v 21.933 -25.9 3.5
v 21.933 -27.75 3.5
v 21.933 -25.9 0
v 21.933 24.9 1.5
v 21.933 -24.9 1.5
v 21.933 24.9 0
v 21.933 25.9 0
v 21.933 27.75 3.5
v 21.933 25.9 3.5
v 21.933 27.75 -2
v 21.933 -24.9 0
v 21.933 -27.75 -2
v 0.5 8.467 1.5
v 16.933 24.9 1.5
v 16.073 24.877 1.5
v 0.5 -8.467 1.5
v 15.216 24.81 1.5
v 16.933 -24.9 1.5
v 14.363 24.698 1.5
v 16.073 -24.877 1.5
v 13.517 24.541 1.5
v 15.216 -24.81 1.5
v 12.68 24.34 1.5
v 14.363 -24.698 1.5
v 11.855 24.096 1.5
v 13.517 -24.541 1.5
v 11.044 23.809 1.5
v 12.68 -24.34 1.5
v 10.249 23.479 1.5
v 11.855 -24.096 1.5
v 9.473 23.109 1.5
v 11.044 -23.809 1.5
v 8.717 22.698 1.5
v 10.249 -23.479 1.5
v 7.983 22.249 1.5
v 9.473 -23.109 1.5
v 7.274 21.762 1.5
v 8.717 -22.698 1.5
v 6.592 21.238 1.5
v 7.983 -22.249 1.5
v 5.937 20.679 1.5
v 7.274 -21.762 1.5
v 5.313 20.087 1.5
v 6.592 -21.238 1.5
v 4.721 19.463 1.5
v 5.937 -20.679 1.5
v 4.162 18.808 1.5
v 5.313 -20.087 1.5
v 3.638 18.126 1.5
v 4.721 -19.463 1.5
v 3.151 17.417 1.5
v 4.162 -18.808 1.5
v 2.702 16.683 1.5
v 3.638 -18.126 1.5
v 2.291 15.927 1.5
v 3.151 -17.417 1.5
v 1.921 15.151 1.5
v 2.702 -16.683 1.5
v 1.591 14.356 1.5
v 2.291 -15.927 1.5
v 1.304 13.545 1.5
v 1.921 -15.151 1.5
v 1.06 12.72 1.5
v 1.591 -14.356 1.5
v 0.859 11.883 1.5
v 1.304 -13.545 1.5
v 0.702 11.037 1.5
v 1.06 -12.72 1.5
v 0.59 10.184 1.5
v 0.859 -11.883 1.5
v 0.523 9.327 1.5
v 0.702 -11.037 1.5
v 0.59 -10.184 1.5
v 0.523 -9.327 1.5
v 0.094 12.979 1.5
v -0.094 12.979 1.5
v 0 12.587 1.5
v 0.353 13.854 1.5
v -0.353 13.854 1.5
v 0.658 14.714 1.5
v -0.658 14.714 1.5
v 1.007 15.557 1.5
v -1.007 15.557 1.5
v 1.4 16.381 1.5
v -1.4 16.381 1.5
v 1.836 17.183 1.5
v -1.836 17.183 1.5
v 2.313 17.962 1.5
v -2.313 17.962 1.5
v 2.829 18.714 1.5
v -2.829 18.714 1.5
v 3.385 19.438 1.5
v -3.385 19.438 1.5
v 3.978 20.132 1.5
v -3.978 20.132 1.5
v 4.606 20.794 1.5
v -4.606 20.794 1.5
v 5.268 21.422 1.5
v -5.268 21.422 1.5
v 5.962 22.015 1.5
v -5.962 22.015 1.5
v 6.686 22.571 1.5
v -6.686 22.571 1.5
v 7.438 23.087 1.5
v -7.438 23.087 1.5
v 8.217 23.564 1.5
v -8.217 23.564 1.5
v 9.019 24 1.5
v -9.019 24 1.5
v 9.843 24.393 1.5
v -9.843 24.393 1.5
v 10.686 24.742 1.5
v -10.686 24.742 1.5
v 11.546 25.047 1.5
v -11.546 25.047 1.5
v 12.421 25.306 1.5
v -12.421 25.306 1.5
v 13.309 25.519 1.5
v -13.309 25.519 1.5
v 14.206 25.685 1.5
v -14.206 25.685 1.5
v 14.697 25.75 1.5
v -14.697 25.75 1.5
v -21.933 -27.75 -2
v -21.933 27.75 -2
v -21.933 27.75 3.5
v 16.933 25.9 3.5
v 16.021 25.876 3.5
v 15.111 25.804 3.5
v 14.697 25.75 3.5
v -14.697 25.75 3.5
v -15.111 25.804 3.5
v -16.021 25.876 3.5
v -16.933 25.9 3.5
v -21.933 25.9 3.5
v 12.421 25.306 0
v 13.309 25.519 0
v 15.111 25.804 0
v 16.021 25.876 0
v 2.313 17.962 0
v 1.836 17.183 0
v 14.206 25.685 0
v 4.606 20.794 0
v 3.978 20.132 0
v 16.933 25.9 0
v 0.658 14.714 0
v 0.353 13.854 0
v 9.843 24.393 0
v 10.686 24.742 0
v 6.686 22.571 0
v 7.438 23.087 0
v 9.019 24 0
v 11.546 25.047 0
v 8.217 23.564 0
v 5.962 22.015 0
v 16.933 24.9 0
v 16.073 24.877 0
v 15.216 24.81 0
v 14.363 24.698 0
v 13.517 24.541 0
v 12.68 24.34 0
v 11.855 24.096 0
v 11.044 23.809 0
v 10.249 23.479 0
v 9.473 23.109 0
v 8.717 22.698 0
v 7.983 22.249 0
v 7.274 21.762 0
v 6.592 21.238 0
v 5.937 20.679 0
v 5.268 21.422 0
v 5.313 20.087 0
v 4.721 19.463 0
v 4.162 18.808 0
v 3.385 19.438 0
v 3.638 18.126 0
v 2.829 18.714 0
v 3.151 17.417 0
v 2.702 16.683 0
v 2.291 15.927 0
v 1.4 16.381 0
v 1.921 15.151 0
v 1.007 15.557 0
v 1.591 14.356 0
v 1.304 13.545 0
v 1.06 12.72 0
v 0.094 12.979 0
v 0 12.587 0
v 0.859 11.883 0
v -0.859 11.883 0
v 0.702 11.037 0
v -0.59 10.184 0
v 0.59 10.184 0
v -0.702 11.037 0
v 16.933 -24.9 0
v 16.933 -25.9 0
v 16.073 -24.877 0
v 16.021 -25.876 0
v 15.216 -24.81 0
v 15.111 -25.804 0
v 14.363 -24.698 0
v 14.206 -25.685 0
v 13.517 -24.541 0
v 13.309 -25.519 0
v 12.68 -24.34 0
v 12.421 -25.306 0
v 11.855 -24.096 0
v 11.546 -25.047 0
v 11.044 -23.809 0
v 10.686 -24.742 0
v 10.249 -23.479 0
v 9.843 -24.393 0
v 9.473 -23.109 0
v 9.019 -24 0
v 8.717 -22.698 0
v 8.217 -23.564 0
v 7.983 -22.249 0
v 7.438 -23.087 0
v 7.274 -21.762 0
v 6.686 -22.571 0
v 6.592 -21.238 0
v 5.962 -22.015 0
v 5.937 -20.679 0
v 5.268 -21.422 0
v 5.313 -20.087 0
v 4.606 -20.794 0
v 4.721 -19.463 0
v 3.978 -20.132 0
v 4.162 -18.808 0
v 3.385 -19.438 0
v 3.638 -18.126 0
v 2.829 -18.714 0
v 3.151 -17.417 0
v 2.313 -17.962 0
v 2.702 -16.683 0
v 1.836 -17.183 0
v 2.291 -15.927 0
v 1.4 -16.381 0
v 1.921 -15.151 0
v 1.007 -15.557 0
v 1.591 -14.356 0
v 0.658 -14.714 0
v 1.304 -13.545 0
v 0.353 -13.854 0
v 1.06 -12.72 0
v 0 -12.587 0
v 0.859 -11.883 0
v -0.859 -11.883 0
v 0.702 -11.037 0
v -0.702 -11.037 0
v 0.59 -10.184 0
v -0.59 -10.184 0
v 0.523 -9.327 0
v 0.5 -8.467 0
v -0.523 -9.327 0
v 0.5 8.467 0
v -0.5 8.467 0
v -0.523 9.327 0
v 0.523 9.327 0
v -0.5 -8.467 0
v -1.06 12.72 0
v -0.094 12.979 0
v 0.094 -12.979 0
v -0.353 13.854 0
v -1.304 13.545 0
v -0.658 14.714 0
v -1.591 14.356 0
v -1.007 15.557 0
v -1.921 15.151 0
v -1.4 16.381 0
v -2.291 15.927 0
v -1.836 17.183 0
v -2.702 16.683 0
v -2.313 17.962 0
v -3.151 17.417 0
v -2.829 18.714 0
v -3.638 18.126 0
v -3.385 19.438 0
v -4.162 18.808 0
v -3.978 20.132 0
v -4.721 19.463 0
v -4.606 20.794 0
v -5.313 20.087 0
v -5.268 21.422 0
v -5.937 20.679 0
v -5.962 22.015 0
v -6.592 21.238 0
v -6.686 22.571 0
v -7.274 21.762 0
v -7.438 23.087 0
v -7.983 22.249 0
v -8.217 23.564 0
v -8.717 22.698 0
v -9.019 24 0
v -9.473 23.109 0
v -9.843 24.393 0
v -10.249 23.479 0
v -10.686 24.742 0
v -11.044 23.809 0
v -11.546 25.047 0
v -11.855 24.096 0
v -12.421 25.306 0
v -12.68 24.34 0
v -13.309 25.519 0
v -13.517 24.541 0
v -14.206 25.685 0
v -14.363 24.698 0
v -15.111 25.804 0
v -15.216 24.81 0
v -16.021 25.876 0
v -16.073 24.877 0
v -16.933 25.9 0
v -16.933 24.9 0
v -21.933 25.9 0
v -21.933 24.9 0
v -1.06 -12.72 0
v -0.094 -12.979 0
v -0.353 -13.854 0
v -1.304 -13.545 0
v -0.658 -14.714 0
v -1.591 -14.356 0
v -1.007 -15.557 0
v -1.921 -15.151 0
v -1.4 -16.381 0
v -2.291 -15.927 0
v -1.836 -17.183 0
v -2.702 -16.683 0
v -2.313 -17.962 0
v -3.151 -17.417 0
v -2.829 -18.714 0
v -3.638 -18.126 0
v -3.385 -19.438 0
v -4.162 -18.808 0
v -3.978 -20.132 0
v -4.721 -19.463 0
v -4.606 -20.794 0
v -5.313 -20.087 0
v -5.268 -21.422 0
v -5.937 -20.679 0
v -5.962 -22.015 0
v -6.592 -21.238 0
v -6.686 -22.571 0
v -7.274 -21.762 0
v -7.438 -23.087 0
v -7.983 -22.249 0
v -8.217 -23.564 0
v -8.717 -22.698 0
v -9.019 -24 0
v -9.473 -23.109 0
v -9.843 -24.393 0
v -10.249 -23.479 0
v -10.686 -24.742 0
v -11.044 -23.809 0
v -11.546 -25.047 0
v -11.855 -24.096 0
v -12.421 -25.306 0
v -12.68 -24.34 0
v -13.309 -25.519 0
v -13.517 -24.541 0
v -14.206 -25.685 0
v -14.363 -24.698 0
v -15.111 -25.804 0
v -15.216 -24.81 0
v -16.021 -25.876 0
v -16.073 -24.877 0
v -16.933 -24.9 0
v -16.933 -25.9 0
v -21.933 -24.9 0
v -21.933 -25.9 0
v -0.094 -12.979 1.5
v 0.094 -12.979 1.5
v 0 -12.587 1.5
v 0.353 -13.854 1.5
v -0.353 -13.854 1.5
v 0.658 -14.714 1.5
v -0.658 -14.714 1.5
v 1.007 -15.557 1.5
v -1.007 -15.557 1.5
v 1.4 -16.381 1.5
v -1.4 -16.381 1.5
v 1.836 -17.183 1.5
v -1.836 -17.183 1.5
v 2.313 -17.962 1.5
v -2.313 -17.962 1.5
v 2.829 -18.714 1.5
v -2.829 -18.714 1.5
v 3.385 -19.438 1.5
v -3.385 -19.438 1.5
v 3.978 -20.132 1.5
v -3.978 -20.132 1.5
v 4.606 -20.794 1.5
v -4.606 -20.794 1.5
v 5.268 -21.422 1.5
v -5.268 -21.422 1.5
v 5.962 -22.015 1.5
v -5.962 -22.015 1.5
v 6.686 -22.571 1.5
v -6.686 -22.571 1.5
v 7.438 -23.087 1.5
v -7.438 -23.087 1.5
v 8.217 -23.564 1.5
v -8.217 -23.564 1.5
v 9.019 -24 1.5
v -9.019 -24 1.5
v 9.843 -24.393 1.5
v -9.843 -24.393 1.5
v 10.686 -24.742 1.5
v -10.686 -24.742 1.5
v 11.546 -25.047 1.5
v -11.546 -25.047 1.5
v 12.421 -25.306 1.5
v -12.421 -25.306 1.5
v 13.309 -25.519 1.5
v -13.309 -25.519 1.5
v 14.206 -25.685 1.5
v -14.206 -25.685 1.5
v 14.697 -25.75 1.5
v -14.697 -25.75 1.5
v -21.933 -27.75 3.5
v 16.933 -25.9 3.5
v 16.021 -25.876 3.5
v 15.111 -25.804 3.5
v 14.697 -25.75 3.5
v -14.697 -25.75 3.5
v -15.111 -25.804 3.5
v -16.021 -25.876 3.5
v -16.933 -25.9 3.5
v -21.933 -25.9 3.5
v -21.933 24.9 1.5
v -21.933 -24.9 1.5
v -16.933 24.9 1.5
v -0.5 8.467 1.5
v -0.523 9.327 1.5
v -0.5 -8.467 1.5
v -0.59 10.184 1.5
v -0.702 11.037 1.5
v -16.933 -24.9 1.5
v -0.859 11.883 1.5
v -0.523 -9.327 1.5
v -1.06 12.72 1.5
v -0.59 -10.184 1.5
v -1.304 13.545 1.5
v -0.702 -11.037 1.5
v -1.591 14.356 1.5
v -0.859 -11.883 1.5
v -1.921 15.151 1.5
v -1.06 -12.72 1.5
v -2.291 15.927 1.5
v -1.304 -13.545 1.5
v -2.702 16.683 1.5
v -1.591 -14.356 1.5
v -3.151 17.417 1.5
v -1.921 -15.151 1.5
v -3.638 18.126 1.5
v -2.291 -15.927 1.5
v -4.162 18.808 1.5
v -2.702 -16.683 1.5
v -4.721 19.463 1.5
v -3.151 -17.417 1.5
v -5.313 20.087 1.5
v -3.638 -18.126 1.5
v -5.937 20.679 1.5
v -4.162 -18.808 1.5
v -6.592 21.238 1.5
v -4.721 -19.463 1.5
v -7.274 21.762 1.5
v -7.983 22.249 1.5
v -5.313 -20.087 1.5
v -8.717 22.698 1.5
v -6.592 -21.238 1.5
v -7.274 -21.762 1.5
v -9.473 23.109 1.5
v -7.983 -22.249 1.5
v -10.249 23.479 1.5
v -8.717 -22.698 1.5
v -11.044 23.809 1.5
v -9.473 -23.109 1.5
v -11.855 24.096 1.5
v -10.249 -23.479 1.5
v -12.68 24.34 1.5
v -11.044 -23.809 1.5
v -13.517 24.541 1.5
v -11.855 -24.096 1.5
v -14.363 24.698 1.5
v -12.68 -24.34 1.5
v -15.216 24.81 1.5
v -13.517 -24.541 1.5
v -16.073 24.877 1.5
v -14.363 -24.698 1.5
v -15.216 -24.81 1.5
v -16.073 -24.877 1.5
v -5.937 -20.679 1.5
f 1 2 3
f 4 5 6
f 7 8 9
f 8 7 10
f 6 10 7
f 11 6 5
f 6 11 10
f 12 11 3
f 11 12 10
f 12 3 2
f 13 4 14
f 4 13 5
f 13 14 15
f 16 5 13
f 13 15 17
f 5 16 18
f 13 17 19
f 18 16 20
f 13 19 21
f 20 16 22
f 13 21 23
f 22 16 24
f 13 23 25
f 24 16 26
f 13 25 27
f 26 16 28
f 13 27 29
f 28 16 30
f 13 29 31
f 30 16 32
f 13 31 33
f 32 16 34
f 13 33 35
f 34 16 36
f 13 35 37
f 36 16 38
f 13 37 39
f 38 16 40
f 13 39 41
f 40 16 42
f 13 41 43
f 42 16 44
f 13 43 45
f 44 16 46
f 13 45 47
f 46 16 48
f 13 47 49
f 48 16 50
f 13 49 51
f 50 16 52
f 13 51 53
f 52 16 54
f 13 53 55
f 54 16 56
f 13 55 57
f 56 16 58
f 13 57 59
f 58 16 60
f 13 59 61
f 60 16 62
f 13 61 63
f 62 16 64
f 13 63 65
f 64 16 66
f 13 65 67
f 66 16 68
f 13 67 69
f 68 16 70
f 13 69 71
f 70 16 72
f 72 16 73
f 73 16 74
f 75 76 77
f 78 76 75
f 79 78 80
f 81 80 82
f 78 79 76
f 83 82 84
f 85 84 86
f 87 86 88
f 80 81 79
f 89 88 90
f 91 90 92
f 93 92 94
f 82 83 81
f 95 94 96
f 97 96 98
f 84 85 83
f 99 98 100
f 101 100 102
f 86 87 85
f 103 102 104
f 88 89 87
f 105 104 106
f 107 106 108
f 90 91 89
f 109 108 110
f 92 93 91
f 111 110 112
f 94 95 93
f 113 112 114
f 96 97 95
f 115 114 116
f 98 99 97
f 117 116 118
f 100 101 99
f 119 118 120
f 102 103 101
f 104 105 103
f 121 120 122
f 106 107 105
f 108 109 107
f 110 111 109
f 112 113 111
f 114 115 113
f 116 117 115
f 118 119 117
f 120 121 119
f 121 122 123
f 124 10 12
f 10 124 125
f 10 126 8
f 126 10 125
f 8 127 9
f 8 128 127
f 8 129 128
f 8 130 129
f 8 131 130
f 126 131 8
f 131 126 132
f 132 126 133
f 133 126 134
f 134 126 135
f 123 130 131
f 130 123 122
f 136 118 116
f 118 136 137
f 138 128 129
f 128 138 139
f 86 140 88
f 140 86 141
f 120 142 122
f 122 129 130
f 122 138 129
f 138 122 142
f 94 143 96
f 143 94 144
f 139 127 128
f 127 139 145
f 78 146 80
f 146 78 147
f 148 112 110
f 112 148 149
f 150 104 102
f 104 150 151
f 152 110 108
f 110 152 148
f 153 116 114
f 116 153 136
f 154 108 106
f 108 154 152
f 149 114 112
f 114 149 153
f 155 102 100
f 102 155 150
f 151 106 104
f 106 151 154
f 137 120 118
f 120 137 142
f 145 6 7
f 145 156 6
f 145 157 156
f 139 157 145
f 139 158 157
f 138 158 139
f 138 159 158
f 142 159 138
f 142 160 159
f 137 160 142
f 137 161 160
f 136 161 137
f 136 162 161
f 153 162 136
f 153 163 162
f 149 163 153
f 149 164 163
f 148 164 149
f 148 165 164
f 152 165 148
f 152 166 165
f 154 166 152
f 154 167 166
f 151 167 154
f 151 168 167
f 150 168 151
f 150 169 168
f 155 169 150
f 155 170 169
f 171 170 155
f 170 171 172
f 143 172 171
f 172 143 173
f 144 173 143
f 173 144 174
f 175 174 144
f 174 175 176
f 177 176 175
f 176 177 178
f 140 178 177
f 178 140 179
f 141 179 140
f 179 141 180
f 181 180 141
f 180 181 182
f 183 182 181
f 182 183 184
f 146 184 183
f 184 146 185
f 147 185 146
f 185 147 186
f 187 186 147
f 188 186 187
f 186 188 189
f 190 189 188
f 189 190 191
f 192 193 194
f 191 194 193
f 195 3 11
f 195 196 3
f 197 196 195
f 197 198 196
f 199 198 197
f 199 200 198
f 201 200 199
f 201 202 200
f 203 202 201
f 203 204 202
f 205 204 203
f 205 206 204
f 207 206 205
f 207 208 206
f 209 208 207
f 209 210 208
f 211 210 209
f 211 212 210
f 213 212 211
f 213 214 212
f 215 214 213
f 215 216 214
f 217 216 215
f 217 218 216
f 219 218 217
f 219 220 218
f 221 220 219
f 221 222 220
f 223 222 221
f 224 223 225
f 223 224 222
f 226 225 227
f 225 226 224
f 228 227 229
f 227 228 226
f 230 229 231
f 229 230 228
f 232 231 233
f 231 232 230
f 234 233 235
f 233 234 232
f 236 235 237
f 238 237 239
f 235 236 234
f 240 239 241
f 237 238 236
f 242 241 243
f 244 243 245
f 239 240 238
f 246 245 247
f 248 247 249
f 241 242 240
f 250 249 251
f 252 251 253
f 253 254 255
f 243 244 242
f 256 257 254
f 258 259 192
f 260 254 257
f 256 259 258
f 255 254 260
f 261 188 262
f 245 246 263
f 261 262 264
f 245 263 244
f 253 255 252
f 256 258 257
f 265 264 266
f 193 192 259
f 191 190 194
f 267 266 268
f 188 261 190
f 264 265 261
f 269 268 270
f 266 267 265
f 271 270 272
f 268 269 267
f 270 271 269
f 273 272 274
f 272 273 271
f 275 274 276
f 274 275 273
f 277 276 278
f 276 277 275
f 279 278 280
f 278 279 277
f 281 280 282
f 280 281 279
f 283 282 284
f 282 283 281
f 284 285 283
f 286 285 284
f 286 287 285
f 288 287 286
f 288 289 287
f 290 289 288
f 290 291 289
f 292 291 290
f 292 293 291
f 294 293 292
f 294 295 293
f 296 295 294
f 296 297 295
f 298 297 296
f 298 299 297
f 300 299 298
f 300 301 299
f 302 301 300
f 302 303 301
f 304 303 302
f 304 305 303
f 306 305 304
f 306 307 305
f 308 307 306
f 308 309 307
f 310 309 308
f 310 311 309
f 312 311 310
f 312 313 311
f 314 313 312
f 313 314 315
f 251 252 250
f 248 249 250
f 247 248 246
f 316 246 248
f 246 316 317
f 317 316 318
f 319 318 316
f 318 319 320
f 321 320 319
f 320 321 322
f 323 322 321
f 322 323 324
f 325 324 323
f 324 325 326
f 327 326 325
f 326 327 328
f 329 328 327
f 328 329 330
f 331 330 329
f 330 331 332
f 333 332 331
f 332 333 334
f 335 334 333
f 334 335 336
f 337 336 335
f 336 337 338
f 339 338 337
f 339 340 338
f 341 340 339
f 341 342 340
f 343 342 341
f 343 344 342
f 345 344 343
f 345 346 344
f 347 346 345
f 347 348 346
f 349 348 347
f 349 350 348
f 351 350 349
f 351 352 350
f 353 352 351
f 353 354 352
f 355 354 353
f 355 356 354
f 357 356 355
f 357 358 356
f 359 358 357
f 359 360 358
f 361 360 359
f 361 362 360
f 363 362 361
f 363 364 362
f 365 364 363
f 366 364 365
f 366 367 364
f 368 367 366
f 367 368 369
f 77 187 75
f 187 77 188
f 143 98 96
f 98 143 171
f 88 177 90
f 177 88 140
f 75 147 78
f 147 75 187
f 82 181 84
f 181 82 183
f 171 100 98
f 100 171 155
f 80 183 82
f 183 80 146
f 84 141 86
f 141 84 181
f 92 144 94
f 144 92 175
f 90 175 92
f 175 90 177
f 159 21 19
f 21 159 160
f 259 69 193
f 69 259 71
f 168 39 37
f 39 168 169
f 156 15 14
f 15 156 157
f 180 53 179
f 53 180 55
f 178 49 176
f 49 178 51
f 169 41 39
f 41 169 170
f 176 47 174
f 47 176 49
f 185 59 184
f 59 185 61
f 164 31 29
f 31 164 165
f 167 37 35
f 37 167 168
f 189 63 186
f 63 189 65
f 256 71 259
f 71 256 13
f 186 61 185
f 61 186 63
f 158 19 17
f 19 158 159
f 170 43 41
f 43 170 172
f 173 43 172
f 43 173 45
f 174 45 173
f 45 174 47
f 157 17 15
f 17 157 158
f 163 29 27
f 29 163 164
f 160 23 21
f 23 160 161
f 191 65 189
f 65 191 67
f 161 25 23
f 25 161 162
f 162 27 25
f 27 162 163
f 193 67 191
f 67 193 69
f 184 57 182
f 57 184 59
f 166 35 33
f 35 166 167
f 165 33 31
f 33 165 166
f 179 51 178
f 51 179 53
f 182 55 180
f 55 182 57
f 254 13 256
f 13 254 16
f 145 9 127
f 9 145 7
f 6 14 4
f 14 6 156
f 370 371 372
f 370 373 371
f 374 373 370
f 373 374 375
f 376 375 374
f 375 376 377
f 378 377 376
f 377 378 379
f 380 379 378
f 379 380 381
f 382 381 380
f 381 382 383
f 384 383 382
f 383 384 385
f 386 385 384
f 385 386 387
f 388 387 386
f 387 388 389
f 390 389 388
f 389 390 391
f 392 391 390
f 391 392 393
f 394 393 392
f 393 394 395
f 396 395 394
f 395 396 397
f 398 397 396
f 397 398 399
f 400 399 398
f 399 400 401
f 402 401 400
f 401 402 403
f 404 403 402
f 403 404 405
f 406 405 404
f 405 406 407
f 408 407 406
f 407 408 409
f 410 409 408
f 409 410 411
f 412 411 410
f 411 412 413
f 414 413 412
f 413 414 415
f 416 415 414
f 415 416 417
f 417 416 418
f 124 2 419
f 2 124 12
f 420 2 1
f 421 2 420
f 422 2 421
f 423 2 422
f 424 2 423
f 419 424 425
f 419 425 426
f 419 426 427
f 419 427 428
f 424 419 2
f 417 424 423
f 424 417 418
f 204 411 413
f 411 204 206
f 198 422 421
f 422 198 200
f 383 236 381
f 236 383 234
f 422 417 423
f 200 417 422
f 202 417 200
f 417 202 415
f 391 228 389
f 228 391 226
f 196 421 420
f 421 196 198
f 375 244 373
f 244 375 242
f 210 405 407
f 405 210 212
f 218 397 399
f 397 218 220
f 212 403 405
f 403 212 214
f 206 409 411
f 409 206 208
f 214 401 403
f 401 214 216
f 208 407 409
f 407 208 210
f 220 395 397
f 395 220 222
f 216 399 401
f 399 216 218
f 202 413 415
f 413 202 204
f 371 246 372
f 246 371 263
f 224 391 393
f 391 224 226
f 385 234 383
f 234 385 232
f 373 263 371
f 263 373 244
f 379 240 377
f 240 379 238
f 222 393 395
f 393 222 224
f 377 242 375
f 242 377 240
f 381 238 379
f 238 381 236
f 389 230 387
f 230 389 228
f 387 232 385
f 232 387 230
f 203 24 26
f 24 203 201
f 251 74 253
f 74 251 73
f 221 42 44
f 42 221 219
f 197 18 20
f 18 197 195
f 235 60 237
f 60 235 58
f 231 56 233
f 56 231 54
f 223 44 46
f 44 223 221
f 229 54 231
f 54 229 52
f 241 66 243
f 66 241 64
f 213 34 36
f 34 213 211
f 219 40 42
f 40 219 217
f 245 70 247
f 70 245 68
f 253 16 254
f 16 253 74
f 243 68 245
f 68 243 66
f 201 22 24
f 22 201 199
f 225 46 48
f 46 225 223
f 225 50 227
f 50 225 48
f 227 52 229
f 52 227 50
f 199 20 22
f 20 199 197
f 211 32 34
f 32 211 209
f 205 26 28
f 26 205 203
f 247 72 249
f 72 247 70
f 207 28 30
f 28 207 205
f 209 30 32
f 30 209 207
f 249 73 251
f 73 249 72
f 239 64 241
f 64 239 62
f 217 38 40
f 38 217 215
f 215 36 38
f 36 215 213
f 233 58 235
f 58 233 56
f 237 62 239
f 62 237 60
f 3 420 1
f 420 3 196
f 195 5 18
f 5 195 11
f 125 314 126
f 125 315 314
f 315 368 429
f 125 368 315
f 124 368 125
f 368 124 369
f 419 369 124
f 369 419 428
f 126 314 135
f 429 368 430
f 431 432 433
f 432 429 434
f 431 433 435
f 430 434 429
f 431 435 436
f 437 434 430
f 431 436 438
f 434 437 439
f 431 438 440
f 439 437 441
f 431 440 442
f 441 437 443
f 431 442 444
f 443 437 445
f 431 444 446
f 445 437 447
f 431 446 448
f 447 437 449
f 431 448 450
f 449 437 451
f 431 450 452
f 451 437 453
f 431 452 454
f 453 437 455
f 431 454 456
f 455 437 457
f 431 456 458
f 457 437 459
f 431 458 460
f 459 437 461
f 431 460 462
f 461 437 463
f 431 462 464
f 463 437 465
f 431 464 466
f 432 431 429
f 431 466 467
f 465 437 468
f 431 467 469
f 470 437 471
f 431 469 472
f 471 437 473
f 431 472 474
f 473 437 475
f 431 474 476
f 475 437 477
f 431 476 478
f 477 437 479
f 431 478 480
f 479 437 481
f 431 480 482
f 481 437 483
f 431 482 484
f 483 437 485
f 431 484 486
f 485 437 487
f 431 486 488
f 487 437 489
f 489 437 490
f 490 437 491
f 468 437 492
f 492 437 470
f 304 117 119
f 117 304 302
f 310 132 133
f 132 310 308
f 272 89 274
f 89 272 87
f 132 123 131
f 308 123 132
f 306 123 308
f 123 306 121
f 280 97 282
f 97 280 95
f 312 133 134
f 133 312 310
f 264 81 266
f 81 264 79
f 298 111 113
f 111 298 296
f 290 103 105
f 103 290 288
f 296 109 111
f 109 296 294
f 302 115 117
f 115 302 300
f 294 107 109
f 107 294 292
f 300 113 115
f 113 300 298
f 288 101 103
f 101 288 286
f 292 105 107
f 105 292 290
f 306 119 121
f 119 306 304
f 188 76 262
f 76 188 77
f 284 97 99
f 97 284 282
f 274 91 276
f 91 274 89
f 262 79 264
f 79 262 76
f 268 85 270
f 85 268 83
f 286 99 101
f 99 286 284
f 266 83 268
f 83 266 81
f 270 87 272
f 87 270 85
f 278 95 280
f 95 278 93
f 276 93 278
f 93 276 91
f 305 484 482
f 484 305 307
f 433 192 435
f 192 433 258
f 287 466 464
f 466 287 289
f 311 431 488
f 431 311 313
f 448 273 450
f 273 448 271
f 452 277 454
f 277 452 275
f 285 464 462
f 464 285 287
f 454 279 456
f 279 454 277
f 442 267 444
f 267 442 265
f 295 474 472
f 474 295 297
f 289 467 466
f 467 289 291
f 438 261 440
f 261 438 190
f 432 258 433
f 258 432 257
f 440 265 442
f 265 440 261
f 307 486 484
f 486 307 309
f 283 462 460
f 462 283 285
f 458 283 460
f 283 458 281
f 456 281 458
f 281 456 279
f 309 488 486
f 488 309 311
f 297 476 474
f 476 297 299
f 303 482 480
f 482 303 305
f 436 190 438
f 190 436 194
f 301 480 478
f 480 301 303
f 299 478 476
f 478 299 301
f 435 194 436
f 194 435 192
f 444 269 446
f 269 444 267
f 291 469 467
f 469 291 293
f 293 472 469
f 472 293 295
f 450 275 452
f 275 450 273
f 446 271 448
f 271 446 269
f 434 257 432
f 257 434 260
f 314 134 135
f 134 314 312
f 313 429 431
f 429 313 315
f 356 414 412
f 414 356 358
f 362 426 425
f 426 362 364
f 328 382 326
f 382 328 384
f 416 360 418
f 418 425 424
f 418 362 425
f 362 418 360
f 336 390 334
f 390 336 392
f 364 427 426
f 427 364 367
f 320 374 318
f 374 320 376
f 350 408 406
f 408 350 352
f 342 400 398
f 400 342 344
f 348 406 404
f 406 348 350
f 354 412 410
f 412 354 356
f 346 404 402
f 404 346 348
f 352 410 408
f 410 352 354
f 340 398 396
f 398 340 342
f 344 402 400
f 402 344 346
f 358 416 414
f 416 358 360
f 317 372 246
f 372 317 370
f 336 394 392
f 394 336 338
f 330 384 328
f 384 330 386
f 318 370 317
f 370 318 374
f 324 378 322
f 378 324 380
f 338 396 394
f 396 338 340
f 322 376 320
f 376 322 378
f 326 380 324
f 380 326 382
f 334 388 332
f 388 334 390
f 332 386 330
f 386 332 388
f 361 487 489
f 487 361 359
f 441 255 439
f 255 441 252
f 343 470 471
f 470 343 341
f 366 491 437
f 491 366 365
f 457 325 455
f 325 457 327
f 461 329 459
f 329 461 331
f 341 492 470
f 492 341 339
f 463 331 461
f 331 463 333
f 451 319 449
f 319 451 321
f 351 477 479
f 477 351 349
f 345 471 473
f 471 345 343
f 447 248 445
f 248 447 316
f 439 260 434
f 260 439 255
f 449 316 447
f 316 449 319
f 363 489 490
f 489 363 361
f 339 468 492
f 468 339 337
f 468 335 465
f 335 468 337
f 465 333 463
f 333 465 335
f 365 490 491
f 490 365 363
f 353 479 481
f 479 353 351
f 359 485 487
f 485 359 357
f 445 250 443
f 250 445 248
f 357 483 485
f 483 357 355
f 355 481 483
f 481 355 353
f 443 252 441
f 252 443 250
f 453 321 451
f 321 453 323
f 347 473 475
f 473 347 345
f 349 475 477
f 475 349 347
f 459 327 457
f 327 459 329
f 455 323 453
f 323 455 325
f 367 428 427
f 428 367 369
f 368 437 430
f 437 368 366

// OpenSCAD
module template(
  thickness, // distance from the bottom of the template to the bottom of the groove
  groove_depth, // distance from the top of the template to the bottom of the groove
  groove_width,
  tape_width,
  roundedness, // how round the edges should be, where 0 is square and 1 is a single circle with the radius equal to half the tape's depth
  overhang, // the length of tape on the template beyond the final groove
  guard_depth, // the length from the top of the template to the top of the guard
  guard_width,
) {
  module quadrant() {
    ideal_radius = roundedness * tape_width / 2;
    inner_radius = ideal_radius - groove_width/2;
    outer_radius = ideal_radius + groove_width/2;
    ggd = groove_depth + guard_depth;

    difference() {
      union() {
        // base
        translate([0, 0, -thickness])
          cube([ideal_radius + overhang, (tape_width + $allowance)/2 + guard_width, groove_depth + thickness]);

        // guard
        translate([0, (tape_width + $allowance)/2, 0])
          cube([ideal_radius + overhang, guard_width, ggd]);
      }

      // circular groove
      translate([0, tape_width/2 - ideal_radius, 0])
        intersection() {
          translate([ideal_radius, 0, 0])
            difference() {
              cylinder(ggd, outer_radius, outer_radius);
              cylinder(ggd, inner_radius, inner_radius);
            }
          cube([ideal_radius, outer_radius, ggd]);
        }

      // center groove that connects the circles
      cube([groove_width/2, tape_width/2 - ideal_radius + $fudge, ggd]);

      // groove along the tape edge
      translate([ideal_radius, (tape_width - groove_width)/2, 0])
        cube([inner_radius, groove_width, ggd]);
    }
  }

  for(i = [0:3])
    mirror([0, i % 2, 0])
    mirror([floor(i / 2), 0, 0])
      quadrant();
}

template(
  thickness = 2,
  groove_depth = 1.5,
  groove_width = 1,
  tape_width = 50.8, // 2in
  roundedness = 2/3,
  overhang = 5,
  guard_depth = 2,
  guard_width = 2,
  $allowance = 0.7,
  $fn = 120,
  $fudge = 0.0001
);
